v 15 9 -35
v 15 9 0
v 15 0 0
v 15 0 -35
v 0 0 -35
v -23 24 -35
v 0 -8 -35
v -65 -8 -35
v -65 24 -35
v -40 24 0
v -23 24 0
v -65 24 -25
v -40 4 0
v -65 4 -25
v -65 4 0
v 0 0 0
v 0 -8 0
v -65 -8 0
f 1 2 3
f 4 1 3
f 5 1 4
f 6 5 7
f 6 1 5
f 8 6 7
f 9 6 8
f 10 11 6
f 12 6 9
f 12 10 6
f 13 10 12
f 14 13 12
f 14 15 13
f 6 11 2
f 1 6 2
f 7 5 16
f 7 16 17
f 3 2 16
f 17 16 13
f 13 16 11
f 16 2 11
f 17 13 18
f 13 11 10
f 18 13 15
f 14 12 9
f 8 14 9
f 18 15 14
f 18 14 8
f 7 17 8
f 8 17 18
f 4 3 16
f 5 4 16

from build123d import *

# Parameters (mm, degrees)
BOSS_EXTRUDE1_DEPTH = 35
CUT_EXTRUDE1_DEPTH  = 20


with BuildPart() as part:
    # Sketch1 → Boss-Extrude1 (new body)
    with BuildSketch(Plane.XY):
        Polygon((0, 0), (0, -8), (-65, -8), (-65, 4), (-65, 24), (-40, 24), (-23, 24), (15, 9), (15, 0), align=None)
    extrude(amount=-BOSS_EXTRUDE1_DEPTH)

    # Sketch2 → Cut-Extrude1 (cut)
    with BuildSketch(Plane(origin=(0, 24, 0), x_dir=(1, 0, 0), z_dir=(0, 1, 0))):
        Polygon((-40, 0), (-65, 25), (-65, 0), align=None)
    extrude(amount=-CUT_EXTRUDE1_DEPTH, mode=Mode.SUBTRACT)


solid = part.part
